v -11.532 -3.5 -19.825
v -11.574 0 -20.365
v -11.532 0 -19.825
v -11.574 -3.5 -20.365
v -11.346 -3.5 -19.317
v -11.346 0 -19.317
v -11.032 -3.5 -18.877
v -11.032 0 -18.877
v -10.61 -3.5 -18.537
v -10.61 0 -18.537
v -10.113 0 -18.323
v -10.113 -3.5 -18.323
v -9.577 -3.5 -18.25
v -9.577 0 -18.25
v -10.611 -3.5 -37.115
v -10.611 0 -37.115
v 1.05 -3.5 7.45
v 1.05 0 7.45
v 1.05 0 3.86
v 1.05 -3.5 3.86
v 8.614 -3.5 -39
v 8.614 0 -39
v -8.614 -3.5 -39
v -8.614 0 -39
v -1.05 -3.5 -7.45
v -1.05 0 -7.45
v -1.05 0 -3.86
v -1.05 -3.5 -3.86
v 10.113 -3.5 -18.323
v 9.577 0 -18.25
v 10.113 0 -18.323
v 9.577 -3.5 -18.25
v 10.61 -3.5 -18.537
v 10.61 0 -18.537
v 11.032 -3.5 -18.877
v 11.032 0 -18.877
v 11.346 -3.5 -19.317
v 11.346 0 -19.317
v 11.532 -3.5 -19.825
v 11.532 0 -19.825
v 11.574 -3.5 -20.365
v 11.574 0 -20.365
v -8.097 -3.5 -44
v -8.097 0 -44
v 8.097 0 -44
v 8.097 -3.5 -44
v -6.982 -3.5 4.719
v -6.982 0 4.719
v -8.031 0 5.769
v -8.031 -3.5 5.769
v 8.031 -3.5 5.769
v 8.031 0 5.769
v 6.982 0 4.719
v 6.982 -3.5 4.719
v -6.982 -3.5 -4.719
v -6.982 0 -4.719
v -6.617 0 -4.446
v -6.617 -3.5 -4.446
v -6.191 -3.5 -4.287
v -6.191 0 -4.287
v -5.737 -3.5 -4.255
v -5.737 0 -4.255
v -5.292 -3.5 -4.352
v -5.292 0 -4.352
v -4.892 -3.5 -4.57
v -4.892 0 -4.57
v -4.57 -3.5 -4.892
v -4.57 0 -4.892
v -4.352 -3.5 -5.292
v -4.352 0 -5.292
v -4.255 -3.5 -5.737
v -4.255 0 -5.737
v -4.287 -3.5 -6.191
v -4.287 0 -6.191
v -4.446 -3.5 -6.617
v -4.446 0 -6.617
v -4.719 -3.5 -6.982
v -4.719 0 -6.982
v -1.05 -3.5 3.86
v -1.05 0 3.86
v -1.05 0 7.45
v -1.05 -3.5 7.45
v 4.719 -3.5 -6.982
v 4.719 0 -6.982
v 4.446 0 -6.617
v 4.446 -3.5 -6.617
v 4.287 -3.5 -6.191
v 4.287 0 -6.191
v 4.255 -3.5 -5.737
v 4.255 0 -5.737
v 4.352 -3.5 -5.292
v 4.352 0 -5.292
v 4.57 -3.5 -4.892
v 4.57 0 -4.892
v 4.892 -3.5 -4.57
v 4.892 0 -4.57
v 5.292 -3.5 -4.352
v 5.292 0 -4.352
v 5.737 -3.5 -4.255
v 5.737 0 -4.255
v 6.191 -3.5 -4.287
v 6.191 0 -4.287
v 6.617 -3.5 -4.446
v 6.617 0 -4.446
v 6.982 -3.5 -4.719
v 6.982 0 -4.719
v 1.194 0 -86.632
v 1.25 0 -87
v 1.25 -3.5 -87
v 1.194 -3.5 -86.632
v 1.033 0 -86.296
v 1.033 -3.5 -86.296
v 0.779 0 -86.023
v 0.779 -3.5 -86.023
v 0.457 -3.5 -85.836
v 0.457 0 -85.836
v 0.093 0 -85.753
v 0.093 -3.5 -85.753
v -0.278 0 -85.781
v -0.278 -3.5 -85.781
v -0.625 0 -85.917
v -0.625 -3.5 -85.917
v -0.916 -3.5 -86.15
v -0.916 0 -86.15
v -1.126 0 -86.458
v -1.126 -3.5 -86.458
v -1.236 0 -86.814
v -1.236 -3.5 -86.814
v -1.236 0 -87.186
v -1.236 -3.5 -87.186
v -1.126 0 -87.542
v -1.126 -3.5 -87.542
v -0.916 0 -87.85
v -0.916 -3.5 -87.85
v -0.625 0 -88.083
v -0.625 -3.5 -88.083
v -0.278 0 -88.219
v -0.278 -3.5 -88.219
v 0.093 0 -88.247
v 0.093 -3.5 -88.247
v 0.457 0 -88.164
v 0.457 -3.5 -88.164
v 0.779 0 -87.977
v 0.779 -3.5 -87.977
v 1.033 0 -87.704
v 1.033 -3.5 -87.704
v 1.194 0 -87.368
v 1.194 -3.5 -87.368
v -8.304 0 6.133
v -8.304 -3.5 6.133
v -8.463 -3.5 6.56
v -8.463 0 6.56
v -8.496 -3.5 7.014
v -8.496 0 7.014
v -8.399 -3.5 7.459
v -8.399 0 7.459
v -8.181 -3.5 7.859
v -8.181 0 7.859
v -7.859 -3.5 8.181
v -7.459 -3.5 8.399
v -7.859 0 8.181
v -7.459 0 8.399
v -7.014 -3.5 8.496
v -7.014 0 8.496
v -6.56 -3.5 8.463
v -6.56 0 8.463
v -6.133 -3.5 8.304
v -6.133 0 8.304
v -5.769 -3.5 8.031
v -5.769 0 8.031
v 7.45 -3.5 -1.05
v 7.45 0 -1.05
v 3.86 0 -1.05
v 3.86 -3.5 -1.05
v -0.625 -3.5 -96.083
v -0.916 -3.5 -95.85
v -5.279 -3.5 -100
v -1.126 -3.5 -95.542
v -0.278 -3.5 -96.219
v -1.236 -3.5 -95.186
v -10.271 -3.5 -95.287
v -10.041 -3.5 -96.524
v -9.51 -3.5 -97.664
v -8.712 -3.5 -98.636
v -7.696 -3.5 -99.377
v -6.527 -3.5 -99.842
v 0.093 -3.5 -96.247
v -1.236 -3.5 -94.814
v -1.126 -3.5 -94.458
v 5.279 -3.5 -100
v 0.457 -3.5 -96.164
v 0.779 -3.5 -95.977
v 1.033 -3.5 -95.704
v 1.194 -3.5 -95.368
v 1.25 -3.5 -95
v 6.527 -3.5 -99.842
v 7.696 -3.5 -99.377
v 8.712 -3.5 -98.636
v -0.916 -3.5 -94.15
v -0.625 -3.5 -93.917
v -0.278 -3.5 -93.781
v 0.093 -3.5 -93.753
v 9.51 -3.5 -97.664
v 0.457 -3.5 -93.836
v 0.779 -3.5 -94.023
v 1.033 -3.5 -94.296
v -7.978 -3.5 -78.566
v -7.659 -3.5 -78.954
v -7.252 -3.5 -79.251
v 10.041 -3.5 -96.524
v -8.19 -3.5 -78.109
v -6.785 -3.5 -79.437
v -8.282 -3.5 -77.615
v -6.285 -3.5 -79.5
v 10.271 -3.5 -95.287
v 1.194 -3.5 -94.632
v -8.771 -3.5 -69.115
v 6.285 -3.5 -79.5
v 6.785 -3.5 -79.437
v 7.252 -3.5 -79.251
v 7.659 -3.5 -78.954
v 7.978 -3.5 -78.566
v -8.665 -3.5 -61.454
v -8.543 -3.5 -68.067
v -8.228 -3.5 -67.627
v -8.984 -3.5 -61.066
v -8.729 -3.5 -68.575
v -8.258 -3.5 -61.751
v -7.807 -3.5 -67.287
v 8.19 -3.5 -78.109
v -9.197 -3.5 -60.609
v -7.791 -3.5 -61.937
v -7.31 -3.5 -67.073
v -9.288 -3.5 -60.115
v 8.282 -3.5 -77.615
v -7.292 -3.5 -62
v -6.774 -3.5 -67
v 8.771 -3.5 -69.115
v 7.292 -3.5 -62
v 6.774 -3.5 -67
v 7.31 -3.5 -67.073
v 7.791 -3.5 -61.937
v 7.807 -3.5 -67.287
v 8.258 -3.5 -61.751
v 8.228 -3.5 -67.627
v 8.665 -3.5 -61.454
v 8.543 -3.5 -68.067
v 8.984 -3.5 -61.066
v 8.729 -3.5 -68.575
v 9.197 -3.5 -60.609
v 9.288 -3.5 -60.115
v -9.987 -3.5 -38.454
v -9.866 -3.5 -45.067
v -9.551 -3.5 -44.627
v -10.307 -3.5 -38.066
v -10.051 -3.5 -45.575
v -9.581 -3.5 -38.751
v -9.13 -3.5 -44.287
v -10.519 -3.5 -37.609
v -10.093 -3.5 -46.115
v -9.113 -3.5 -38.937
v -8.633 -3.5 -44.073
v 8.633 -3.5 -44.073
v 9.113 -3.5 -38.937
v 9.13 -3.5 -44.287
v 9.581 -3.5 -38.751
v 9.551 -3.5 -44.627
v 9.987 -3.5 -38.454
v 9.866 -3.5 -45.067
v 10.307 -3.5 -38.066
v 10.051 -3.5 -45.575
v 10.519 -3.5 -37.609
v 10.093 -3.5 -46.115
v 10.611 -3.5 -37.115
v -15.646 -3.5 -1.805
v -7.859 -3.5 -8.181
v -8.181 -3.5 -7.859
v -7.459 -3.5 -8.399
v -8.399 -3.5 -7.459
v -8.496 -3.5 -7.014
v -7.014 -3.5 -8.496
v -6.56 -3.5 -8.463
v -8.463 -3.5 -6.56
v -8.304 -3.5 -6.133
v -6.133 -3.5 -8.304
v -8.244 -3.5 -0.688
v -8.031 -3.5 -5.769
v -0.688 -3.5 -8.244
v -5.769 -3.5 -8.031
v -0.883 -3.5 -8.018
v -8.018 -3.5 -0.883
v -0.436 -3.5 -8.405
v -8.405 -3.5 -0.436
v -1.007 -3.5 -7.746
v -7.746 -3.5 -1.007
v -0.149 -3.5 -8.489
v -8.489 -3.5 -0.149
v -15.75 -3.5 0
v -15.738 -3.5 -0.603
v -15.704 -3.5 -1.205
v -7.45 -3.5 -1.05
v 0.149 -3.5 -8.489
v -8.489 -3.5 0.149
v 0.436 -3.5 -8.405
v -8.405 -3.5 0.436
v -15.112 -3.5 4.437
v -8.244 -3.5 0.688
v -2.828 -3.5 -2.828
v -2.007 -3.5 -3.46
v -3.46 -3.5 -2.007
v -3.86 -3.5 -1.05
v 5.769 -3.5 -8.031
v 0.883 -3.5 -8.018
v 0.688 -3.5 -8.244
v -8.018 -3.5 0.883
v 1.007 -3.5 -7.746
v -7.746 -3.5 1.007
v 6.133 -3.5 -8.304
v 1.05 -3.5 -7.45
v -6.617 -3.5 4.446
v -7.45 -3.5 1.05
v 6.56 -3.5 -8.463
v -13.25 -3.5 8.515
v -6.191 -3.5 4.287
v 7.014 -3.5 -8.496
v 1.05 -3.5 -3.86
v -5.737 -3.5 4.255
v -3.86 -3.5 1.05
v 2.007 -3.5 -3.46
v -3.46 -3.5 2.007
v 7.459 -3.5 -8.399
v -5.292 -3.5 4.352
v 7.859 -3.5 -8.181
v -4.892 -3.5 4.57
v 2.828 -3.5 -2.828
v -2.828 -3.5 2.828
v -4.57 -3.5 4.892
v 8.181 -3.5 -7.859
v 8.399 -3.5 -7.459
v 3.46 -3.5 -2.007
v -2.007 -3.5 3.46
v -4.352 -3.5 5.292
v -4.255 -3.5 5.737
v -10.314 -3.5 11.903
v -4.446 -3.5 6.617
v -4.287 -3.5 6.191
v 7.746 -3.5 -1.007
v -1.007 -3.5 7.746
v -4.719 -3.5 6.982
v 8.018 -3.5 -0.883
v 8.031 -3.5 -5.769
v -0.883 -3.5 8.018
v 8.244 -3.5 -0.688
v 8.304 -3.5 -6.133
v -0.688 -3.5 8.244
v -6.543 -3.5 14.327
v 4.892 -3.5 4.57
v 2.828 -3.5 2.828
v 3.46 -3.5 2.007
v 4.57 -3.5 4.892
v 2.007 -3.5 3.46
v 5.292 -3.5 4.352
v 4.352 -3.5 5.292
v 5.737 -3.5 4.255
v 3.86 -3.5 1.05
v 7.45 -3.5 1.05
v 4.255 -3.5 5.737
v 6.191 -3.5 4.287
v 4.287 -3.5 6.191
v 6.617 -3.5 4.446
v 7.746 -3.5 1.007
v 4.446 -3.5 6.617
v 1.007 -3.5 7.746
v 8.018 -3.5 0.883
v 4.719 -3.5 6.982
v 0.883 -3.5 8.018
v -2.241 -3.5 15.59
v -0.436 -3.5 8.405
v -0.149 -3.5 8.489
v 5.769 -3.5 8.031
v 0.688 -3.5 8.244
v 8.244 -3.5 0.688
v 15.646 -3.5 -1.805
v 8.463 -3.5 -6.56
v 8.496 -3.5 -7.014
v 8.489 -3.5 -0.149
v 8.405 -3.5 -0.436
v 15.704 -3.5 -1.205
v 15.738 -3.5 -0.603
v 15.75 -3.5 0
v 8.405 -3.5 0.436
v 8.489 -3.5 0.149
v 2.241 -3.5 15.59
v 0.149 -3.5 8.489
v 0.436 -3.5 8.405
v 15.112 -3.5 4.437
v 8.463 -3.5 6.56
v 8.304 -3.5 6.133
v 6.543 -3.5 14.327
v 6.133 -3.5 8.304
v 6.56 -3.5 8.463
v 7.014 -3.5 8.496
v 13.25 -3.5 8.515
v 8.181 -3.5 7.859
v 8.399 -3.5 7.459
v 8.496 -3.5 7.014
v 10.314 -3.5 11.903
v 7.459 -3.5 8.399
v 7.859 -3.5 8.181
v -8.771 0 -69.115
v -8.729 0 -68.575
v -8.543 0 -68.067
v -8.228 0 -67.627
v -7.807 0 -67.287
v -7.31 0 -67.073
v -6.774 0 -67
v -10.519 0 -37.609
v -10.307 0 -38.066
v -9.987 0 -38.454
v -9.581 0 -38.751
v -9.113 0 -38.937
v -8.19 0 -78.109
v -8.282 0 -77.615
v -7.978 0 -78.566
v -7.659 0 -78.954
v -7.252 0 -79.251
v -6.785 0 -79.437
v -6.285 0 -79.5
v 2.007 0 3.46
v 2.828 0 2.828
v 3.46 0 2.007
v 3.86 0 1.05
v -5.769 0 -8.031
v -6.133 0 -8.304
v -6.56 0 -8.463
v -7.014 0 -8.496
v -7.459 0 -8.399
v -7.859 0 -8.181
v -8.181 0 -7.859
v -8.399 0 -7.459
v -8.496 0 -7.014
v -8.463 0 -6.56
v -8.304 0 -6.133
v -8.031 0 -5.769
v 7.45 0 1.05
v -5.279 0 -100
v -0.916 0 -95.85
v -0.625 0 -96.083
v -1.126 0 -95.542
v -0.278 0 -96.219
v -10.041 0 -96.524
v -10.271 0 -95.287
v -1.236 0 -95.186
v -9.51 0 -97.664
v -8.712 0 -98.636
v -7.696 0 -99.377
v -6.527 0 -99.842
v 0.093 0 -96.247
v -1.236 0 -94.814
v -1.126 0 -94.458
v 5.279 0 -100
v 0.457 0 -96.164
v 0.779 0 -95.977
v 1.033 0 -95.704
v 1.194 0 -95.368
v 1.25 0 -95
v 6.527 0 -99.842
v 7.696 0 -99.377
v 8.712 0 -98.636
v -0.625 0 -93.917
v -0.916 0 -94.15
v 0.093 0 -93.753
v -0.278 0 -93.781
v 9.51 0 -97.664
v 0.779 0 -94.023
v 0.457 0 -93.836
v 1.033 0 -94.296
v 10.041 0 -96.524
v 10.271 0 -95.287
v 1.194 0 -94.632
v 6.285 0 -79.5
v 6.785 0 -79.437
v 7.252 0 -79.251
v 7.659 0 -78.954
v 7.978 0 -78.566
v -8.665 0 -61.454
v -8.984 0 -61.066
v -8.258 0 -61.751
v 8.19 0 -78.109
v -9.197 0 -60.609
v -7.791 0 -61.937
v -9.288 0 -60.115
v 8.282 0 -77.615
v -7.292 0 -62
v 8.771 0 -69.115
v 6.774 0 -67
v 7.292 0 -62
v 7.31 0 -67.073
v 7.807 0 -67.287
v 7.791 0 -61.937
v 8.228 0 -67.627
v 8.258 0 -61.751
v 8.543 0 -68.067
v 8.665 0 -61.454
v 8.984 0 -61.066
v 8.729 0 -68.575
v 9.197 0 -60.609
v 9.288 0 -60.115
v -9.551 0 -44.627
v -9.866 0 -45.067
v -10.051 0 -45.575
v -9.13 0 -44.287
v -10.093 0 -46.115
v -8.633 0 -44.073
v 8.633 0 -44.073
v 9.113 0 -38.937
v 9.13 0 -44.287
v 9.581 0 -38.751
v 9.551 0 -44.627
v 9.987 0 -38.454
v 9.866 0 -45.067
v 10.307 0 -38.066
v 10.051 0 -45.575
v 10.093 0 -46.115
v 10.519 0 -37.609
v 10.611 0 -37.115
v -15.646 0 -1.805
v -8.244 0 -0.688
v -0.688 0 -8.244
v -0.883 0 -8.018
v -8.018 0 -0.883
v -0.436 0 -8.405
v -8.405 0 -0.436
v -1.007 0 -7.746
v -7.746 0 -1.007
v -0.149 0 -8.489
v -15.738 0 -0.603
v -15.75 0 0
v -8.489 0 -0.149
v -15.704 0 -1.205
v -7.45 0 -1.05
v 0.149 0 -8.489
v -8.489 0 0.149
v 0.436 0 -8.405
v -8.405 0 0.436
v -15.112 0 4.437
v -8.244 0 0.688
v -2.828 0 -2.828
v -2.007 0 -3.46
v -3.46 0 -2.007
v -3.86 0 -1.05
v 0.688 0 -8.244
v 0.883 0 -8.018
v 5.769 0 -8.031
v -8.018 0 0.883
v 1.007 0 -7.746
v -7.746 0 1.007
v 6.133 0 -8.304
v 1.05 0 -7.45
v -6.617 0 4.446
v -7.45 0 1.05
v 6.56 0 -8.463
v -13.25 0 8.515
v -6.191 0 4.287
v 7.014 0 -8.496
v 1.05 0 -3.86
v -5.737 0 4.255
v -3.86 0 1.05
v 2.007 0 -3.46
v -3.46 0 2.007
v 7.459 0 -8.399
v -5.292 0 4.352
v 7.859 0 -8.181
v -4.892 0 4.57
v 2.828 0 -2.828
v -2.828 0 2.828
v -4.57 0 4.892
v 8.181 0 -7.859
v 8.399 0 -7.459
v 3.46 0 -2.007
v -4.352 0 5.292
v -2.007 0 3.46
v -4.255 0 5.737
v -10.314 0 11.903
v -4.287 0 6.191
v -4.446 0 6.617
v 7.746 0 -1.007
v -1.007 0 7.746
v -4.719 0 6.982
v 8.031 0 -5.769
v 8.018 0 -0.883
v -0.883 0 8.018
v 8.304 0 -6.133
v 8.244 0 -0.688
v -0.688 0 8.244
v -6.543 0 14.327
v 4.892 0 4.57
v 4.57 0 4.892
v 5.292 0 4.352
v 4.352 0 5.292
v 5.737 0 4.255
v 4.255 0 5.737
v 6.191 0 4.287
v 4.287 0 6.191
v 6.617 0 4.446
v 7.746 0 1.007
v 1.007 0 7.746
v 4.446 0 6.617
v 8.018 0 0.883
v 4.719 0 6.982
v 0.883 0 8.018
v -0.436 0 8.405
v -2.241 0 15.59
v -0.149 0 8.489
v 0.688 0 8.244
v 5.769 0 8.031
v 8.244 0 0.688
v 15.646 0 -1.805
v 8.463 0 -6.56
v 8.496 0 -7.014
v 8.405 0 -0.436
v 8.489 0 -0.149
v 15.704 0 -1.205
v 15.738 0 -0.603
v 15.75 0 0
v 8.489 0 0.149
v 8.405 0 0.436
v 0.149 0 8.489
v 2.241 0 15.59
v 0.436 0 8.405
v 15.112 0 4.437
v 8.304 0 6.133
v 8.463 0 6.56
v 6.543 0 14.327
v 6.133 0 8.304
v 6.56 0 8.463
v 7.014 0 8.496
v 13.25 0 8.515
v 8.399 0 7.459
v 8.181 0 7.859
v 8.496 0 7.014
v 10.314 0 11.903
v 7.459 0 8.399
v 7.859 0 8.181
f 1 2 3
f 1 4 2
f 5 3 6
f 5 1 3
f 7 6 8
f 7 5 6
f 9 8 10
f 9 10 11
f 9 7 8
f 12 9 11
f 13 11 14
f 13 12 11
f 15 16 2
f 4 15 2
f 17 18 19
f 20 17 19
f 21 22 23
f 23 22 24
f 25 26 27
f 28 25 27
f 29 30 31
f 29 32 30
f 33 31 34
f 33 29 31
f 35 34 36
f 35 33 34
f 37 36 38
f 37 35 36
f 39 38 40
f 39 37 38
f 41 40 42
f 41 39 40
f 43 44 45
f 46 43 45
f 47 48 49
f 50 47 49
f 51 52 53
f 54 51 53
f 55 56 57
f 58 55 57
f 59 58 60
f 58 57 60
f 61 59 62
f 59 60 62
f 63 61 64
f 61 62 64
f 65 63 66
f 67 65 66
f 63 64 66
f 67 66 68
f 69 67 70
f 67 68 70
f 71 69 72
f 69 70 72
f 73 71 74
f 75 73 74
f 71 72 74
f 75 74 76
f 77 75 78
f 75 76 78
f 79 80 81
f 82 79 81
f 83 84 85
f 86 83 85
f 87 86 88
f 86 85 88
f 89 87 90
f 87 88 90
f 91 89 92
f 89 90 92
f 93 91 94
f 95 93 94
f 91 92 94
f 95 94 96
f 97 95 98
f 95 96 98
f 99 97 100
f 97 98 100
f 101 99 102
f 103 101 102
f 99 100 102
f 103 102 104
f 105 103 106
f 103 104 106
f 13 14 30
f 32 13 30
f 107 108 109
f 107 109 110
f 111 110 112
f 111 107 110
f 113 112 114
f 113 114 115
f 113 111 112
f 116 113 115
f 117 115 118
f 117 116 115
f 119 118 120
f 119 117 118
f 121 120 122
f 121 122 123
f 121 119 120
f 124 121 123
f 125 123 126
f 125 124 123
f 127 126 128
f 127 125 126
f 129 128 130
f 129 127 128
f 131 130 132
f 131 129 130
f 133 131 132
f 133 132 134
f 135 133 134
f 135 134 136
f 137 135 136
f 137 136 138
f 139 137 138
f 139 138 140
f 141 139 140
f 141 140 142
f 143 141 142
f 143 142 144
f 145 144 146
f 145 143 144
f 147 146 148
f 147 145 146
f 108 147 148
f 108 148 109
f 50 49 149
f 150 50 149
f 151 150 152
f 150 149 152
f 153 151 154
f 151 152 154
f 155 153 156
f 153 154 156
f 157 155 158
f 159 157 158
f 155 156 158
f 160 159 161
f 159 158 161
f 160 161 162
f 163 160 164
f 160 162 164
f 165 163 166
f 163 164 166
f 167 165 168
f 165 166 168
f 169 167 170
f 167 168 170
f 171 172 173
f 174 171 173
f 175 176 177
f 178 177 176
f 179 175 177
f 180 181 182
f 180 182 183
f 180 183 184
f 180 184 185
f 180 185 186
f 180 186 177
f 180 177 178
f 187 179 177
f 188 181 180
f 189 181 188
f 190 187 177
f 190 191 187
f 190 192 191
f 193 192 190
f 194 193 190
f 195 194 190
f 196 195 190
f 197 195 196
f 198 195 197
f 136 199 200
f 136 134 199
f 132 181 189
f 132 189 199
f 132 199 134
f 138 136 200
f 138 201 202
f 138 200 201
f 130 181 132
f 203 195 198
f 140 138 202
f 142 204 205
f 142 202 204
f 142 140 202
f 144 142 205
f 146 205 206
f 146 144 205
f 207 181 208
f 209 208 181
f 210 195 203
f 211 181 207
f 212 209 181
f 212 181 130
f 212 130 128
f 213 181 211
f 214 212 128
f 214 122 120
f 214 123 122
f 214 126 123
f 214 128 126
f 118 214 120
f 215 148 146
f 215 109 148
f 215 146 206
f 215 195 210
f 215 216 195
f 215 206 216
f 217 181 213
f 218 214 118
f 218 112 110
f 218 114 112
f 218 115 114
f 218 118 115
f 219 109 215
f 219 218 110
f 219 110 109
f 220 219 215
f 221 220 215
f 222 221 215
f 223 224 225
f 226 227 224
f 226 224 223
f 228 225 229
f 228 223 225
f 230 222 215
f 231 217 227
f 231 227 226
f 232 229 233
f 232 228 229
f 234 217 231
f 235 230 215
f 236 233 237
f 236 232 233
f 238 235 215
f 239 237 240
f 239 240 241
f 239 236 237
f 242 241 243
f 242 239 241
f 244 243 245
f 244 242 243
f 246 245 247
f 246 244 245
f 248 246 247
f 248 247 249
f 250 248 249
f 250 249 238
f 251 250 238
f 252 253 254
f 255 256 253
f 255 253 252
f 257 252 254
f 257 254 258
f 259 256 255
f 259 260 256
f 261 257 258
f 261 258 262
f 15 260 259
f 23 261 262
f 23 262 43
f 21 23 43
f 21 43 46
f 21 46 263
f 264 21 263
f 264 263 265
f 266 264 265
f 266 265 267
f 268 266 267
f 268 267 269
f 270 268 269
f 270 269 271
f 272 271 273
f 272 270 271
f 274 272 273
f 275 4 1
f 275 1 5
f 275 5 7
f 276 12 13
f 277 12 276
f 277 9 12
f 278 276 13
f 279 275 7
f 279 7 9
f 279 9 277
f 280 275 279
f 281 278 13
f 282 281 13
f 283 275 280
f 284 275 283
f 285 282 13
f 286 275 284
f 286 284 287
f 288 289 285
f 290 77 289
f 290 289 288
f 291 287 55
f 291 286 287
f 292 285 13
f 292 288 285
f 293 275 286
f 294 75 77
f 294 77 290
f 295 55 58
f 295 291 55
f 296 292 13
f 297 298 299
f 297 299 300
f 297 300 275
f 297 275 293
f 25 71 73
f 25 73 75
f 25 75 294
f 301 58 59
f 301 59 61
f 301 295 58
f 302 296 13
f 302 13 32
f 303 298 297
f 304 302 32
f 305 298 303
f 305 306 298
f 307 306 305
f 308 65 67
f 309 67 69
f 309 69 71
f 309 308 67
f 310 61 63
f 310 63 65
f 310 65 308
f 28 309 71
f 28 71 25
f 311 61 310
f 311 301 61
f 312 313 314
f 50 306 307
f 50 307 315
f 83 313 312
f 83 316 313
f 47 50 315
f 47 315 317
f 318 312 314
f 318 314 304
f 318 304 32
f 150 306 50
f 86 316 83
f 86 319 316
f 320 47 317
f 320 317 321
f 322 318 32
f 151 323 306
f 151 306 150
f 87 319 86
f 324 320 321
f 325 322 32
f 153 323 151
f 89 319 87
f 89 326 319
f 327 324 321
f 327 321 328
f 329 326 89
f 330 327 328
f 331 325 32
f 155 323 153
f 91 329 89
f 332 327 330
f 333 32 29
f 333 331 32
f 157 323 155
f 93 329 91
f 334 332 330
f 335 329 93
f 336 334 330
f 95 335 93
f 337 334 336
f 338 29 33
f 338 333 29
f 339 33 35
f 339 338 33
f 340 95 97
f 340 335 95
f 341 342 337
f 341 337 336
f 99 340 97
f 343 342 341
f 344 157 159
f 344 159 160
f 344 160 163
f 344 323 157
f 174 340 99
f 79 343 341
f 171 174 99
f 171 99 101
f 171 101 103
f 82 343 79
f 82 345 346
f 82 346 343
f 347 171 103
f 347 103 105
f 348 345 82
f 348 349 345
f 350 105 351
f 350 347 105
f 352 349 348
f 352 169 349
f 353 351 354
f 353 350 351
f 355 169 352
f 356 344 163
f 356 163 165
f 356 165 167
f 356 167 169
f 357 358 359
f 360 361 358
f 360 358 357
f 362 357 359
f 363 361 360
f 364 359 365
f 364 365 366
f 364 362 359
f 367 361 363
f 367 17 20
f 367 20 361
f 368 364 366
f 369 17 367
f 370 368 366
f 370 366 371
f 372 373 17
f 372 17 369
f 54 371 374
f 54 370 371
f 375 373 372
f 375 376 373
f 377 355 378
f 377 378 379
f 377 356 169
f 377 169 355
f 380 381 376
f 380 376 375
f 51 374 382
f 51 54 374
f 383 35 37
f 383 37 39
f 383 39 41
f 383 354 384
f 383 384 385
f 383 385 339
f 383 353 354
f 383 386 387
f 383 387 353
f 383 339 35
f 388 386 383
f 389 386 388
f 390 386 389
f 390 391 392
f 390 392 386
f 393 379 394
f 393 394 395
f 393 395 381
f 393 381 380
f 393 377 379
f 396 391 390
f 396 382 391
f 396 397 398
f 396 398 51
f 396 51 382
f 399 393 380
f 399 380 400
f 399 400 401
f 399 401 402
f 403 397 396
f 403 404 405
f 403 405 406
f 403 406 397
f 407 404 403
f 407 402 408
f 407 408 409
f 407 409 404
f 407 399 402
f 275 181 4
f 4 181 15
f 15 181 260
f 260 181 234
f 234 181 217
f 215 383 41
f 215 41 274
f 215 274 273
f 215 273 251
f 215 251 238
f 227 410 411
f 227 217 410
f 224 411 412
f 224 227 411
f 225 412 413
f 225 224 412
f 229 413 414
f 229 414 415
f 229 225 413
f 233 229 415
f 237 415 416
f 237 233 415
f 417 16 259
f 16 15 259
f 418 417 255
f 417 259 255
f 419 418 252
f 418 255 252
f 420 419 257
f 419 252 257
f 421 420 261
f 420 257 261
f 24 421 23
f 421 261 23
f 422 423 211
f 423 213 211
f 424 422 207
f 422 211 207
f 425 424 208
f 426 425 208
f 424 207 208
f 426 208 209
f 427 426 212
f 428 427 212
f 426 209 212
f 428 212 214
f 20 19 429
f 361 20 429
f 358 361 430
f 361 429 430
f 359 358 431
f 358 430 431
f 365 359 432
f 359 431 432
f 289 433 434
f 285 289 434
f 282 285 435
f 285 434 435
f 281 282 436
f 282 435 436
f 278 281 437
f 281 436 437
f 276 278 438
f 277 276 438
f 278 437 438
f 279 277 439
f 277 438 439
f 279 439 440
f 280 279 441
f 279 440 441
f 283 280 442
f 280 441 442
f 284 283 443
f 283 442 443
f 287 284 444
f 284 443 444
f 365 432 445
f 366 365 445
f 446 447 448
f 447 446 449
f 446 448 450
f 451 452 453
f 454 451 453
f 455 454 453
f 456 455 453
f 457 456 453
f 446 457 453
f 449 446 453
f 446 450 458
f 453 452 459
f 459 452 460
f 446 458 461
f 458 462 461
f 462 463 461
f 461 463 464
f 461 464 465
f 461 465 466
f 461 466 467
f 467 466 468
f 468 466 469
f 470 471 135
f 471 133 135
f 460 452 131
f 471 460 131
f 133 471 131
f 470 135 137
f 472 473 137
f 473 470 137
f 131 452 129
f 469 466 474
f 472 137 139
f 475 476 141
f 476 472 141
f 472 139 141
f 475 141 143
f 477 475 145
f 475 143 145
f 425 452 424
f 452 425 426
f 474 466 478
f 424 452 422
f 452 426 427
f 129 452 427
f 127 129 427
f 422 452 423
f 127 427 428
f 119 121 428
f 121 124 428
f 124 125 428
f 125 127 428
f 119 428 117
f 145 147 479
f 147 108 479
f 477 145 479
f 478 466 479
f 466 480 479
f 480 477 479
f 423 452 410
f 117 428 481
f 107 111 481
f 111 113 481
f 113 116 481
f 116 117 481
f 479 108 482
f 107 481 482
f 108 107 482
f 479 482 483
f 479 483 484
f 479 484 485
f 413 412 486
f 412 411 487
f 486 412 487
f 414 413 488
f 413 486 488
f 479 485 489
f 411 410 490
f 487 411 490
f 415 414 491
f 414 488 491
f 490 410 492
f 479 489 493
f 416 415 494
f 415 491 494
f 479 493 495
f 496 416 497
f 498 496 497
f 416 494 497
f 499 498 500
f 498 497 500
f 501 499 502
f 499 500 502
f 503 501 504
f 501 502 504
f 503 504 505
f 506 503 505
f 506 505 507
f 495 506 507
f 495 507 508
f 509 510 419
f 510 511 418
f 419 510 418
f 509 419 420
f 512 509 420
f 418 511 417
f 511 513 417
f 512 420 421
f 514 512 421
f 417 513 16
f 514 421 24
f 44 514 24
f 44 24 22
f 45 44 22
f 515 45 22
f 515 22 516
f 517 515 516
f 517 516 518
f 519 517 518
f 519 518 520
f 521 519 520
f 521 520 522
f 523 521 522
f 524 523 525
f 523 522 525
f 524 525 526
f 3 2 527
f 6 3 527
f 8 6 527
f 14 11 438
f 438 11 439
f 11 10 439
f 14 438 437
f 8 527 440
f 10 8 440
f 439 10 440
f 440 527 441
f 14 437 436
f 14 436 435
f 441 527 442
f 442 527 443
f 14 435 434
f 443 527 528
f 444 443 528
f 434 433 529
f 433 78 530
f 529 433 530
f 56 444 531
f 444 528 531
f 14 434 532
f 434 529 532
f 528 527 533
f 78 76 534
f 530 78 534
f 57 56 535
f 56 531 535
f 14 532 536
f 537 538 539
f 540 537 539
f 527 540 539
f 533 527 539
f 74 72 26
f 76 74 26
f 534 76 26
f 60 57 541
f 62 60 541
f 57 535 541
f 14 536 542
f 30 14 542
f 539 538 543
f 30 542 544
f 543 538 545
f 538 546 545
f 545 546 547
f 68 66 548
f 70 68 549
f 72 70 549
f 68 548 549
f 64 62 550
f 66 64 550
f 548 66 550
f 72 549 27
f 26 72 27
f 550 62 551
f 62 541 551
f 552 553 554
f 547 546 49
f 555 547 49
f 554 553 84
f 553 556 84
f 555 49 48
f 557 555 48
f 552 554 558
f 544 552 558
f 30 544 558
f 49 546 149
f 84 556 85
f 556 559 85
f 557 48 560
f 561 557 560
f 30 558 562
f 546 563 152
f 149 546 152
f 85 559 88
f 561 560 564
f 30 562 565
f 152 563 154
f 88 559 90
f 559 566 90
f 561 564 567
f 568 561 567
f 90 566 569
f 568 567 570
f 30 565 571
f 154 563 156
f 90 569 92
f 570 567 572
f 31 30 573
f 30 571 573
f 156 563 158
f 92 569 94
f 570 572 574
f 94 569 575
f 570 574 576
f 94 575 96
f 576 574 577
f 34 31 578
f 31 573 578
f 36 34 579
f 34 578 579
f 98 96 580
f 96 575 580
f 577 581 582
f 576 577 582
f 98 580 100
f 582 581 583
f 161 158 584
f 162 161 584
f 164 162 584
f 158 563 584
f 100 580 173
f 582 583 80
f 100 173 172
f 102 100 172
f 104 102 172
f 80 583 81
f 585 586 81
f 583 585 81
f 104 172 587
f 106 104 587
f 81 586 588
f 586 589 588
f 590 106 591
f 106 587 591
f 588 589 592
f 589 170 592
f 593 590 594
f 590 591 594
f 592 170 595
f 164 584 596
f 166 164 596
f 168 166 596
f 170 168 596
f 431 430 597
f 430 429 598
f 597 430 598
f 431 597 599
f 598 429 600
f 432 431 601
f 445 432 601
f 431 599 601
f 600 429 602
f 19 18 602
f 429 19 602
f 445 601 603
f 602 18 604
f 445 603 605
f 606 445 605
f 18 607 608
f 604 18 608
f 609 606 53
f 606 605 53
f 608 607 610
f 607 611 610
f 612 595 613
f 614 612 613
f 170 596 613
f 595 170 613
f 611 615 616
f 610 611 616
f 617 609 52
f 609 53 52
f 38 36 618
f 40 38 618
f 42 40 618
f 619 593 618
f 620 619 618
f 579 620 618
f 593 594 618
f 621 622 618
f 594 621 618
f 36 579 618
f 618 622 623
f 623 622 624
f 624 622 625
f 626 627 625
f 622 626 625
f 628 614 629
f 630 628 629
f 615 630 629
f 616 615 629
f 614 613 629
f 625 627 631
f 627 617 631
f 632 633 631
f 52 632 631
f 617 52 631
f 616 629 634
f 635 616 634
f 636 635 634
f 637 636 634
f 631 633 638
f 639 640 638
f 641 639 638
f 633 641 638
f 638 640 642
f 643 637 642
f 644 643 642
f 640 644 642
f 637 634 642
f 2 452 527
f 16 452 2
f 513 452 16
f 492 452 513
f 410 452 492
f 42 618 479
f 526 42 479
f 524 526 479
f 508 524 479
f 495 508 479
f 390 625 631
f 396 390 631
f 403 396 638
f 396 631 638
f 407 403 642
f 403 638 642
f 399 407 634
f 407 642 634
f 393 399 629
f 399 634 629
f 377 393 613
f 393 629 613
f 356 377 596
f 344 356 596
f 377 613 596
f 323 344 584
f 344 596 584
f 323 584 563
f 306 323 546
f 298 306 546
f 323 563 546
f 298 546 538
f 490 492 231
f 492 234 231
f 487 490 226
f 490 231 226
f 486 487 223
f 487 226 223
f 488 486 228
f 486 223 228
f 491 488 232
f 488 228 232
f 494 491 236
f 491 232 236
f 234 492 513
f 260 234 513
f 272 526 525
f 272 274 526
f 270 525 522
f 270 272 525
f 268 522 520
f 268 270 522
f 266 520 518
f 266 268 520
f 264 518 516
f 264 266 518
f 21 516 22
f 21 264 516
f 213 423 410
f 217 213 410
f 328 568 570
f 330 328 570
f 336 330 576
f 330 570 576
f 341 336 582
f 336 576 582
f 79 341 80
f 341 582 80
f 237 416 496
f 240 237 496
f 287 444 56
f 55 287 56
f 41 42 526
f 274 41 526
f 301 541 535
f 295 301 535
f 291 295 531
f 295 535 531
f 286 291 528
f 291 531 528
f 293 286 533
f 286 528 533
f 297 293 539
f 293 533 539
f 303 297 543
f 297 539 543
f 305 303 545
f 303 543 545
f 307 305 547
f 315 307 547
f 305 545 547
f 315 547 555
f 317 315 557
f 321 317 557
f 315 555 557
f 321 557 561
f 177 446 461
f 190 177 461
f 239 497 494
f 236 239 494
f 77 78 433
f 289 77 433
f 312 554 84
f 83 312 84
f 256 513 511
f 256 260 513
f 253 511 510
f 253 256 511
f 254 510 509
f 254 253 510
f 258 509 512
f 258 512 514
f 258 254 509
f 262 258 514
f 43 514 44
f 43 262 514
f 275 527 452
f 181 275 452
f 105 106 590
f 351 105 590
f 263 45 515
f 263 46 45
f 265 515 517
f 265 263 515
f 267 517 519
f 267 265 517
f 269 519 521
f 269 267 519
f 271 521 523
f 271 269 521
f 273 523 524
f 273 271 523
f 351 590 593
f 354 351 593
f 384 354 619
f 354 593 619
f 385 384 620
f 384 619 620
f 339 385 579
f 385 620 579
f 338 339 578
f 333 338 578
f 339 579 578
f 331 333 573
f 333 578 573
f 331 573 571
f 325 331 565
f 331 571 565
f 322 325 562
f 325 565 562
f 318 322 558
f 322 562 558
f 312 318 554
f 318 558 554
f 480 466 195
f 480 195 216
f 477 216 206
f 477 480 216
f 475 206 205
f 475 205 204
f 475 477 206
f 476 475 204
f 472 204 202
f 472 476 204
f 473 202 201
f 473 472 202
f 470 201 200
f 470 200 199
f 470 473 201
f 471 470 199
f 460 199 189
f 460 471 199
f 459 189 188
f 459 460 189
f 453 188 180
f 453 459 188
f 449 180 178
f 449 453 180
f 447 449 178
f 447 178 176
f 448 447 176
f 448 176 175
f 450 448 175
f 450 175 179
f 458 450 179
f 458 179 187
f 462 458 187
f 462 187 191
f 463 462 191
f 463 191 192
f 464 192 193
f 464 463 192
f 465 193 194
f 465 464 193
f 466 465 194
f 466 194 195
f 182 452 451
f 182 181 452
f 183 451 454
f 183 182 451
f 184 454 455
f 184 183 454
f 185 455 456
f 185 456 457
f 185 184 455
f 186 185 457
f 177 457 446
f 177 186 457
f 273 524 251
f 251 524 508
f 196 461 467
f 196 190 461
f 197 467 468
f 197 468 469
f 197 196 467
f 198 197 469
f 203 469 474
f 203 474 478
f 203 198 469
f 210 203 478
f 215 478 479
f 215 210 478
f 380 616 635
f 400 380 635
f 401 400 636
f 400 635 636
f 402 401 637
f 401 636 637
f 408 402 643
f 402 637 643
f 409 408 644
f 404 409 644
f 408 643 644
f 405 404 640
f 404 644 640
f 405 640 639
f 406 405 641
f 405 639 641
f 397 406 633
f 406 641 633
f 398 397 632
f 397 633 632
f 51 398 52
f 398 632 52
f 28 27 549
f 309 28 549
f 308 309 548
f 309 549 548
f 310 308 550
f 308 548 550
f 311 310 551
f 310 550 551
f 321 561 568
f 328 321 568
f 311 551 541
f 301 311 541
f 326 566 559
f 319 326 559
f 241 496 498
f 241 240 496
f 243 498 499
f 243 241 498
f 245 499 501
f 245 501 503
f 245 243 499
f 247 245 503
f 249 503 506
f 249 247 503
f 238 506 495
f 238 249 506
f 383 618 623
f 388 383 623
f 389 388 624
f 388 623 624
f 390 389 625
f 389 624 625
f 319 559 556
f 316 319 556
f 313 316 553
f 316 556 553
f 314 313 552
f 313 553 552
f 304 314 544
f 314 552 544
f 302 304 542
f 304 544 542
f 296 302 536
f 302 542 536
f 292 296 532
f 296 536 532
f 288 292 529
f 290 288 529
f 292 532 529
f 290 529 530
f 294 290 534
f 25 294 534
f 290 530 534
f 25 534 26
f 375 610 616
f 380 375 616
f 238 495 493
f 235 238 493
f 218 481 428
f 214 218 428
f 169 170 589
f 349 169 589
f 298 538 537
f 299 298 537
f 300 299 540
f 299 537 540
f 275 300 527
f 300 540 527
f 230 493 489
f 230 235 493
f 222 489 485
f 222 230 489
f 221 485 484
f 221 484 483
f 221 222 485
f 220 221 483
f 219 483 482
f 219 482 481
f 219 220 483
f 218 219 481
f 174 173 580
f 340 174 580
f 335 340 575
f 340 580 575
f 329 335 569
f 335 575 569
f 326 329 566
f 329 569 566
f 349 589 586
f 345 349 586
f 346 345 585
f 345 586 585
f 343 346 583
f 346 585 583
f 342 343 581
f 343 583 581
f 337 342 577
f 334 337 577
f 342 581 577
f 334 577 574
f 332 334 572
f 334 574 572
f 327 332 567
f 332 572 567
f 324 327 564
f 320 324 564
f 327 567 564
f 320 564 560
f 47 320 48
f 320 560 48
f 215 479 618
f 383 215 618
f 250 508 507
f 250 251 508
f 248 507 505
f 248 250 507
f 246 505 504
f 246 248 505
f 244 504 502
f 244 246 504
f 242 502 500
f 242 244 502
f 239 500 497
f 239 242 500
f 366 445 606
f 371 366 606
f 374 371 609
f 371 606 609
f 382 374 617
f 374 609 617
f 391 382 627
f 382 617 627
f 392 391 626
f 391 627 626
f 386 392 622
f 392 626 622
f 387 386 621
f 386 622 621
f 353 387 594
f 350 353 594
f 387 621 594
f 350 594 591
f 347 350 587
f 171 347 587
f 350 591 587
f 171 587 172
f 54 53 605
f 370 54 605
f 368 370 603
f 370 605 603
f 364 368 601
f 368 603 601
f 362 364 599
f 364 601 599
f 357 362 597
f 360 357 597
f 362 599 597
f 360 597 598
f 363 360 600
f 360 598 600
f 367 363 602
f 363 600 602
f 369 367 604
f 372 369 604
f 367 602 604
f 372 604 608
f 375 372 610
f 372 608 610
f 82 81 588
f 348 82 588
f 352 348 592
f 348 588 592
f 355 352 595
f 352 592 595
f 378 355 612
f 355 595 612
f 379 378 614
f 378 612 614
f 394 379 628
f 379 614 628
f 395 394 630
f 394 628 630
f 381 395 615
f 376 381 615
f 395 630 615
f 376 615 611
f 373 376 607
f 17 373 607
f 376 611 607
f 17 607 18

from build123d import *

# Parameters (mm, degrees)
F0_R     = 1.25
F1_DEPTH = 3.5
F2_R     = 5
F3_R     = 2


with BuildPart() as f1:
    # F0 (on Front) → F1 (new body)
    with BuildSketch(Plane.XZ):
        with BuildLine():
            Line((15.646196, -1.805281), (15.75, 0))
            ThreePointArc((15.75, 0), (0, 15.75), (-15.75, 0))
            Line((-15.75, 0), (-15.646196, -1.805281))
            ThreePointArc((-15.646196, -1.805281), (0, -15.75), (15.646196, -1.805281))
        make_face()
        with BuildLine():
            ThreePointArc((-5.768629, -8.031371), (-8.031371, -8.031371), (-8.031371, -5.768629))
            Line((-8.031371, -5.768629), (-6.982024, -4.719283))
            ThreePointArc((-6.982024, -4.719283), (-4.719283, -4.719283), (-4.719283, -6.982024))
            Line((-4.719283, -6.982024), (-5.768629, -8.031371))
        make_face(mode=Mode.SUBTRACT)
        with BuildLine():
            ThreePointArc((-8.031371, 5.768629), (-8.031371, 8.031371), (-5.768629, 8.031371))
            Line((-5.768629, 8.031371), (-4.719283, 6.982024))
            ThreePointArc((-4.719283, 6.982024), (-4.719283, 4.719283), (-6.982024, 4.719283))
            Line((-6.982024, 4.719283), (-8.031371, 5.768629))
        make_face(mode=Mode.SUBTRACT)
        with BuildLine():
            Line((3.859728, 1.05), (7.45, 1.05))
            ThreePointArc((7.45, 1.05), (8.5, 0), (7.45, -1.05))
            Line((7.45, -1.05), (3.859728, -1.05))
            ThreePointArc((3.859728, -1.05), (2.828427, -2.828427), (1.05, -3.859728))
            Line((1.05, -3.859728), (1.05, -7.45))
            ThreePointArc((1.05, -7.45), (0, -8.5), (-1.05, -7.45))
            Line((-1.05, -7.45), (-1.05, -3.859728))
            ThreePointArc((-1.05, -3.859728), (-2.828427, -2.828427), (-3.859728, -1.05))
            Line((-3.859728, -1.05), (-7.45, -1.05))
            ThreePointArc((-7.45, -1.05), (-8.5, 0), (-7.45, 1.05))
            Line((-7.45, 1.05), (-3.859728, 1.05))
            ThreePointArc((-3.859728, 1.05), (-2.828427, 2.828427), (-1.05, 3.859728))
            Line((-1.05, 3.859728), (-1.05, 7.45))
            ThreePointArc((-1.05, 7.45), (0, 8.5), (1.05, 7.45))
            Line((1.05, 7.45), (1.05, 3.859728))
            ThreePointArc((1.05, 3.859728), (2.828427, 2.828427), (3.859728, 1.05))
        make_face(mode=Mode.SUBTRACT)
        with BuildLine():
            ThreePointArc((8.031371, -5.768629), (8.031371, -8.031371), (5.768629, -8.031371))
            Line((5.768629, -8.031371), (4.719283, -6.982024))
            ThreePointArc((4.719283, -6.982024), (4.719283, -4.719283), (6.982024, -4.719283))
            Line((6.982024, -4.719283), (8.031371, -5.768629))
        make_face(mode=Mode.SUBTRACT)
        with BuildLine():
            ThreePointArc((6.982024, 4.719283), (4.719283, 4.719283), (4.719283, 6.982024))
            Line((4.719283, 6.982024), (5.768629, 8.031371))
            ThreePointArc((5.768629, 8.031371), (8.031371, 8.031371), (8.031371, 5.768629))
            Line((8.031371, 5.768629), (6.982024, 4.719283))
        make_face(mode=Mode.SUBTRACT)
        with BuildLine():
            ThreePointArc((15.646196, -1.805281), (15.724028, -0.904132), (15.75, 0))
            Line((15.75, 0), (15.646196, -1.805281))
        make_face()
        with BuildLine():
            Line((-15.646196, -1.805281), (-15.75, 0))
            ThreePointArc((-15.75, 0), (-15.724028, -0.904132), (-15.646196, -1.805281))
        make_face()
        with BuildLine():
            Line((10, -100), (15.646196, -1.805281))
            ThreePointArc((15.646196, -1.805281), (0, -15.75), (-15.646196, -1.805281))
            Line((-15.646196, -1.805281), (-10, -100))
            Line((-10, -100), (0, -100))
            Line((0, -100), (10, -100))
        make_face()
        with Locations((0, -95)):
            Circle(F0_R, mode=Mode.SUBTRACT)
        with Locations((0, -87)):
            Circle(F0_R, mode=Mode.SUBTRACT)
        Polygon((-8.892545, -67), (0, -67), (8.892545, -67), (8.173795, -79.5), (0, -79.5), (-8.173795, -79.5), align=None, mode=Mode.SUBTRACT)
        Polygon((-10.215045, -44), (0, -44), (10.215045, -44), (9.180045, -62), (0, -62), (-9.180045, -62), align=None, mode=Mode.SUBTRACT)
        Polygon((-11.69567, -18.25), (0, -18.25), (11.69567, -18.25), (10.502545, -39), (0, -39), (-10.502545, -39), align=None, mode=Mode.SUBTRACT)
    extrude(amount=F1_DEPTH)

    # F2
    f2_edges = [f1.edges().sort_by_distance(p)[0] for p in [
        (-10, -1.75, -100),
        (10, -1.75, -100),
    ]]
    fillet(f2_edges, radius=F2_R)

    # F3
    f3_edges = [f1.edges().sort_by_distance(p)[0] for p in [
        (-10.502545, -1.75, -39),
        (-9.180045, -1.75, -62),
        (-8.173795, -1.75, -79.5),
        (-8.892545, -1.75, -67),
        (-10.215045, -1.75, -44),
        (-11.69567, -1.75, -18.25),
        (11.69567, -1.75, -18.25),
        (10.215045, -1.75, -44),
        (8.892545, -1.75, -67),
        (10.502545, -1.75, -39),
        (9.180045, -1.75, -62),
        (8.173795, -1.75, -79.5),
    ]]
    fillet(f3_edges, radius=F3_R)


solid = f1.part
